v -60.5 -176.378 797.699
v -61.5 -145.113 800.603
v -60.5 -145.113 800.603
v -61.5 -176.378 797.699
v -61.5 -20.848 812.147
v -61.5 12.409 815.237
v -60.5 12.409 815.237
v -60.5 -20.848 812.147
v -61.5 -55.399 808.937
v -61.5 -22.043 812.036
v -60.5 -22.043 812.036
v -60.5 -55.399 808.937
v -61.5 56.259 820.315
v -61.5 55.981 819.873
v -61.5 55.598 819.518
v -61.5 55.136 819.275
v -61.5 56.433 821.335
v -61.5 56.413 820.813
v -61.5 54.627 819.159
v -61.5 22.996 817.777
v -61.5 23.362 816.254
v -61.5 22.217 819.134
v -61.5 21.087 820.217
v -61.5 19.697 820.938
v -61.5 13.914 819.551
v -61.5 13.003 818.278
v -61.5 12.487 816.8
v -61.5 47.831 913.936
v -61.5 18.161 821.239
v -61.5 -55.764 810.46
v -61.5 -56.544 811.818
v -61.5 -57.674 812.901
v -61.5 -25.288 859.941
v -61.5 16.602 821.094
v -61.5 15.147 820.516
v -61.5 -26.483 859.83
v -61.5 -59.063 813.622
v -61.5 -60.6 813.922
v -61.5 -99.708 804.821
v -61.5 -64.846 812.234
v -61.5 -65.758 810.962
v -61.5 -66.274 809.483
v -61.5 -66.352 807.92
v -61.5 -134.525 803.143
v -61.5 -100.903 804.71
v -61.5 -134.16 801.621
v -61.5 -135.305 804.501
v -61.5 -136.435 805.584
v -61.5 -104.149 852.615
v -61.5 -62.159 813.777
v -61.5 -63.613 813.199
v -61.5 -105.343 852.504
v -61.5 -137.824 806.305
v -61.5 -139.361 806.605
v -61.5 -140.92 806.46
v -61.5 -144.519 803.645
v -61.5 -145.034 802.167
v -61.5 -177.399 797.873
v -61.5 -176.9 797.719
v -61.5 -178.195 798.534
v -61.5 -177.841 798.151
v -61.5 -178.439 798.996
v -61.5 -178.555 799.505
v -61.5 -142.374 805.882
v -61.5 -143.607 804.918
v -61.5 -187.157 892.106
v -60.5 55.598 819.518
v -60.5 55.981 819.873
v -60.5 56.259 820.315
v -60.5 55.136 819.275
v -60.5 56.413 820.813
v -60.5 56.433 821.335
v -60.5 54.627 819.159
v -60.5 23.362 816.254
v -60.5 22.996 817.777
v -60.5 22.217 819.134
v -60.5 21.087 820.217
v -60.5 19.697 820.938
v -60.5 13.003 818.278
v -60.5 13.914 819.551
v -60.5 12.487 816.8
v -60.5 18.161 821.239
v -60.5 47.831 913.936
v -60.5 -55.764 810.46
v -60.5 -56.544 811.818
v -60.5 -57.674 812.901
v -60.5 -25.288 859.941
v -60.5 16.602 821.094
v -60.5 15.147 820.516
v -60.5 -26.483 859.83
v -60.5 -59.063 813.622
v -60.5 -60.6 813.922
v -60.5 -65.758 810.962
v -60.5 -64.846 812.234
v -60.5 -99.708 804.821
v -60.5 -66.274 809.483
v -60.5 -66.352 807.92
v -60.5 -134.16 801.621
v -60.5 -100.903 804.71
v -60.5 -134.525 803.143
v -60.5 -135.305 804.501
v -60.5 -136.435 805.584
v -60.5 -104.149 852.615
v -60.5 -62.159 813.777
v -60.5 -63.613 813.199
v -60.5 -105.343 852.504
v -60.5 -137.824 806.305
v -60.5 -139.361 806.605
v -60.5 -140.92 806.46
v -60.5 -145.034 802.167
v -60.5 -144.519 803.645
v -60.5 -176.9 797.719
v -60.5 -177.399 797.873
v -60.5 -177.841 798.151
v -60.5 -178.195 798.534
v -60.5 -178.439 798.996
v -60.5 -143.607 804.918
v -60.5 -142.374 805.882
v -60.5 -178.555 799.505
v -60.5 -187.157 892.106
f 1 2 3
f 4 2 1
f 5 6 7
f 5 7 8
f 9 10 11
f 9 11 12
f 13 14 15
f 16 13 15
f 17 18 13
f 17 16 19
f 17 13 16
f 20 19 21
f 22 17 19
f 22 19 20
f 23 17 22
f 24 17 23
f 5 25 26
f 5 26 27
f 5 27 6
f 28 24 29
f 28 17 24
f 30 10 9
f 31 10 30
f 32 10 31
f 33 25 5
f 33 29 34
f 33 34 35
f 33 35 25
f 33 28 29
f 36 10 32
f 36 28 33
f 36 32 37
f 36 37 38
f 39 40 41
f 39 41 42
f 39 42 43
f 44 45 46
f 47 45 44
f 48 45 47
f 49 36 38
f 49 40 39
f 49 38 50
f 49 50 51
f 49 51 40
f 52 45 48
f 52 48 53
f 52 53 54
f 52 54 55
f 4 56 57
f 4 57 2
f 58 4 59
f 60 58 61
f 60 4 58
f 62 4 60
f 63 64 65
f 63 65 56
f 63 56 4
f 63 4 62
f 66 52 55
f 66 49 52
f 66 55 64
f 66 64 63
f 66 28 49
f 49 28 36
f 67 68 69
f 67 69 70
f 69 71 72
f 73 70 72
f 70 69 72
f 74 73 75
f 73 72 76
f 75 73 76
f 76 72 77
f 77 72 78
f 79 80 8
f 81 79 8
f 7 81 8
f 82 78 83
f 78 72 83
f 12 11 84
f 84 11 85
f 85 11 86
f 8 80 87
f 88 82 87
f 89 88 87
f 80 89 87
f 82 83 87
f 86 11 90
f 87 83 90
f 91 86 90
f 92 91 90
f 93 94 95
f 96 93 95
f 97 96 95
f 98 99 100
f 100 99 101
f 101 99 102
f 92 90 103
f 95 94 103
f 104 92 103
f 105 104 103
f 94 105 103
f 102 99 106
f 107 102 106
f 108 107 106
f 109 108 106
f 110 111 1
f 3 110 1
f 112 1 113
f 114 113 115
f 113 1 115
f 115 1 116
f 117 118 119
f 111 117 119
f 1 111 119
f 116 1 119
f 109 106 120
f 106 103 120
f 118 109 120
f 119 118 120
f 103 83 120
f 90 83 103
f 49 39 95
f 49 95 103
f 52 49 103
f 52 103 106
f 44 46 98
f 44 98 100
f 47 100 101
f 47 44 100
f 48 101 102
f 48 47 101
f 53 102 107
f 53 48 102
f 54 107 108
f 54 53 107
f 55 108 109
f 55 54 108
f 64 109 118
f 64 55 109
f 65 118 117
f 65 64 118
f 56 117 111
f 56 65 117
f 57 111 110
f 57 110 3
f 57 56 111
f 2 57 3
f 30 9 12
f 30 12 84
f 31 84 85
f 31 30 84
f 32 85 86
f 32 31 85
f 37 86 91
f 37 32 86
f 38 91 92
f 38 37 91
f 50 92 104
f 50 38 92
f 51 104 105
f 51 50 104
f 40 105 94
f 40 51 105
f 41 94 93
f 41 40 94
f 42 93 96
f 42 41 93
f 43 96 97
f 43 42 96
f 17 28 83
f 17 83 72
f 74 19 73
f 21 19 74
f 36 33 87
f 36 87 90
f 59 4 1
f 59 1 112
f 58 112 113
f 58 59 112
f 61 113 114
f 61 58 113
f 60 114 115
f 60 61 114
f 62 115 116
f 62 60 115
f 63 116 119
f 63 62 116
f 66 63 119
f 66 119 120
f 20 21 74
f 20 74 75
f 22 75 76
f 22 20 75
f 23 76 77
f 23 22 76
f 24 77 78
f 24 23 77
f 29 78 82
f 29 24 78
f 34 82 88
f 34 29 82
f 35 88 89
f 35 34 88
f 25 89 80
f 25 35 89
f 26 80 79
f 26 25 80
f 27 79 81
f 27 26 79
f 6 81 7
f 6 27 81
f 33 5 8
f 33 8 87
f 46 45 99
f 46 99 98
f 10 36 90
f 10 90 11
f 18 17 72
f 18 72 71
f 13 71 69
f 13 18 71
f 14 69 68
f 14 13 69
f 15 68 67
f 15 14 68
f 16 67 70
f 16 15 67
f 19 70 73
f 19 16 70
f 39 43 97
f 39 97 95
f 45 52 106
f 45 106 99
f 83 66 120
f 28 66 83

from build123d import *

# Parameters (mm, degrees)
EXTRUDE_1_DEPTH = 1


with BuildPart() as part:
    # 草图1 → 凸台-拉伸1 (new body)
    with BuildSketch(Plane(origin=(-61.5, 0, 0), x_dir=(0, -1, 0), z_dir=(-1, 0, 0))):
        with BuildLine():
            Line((145.112990447, 800.603209432), (176.378367534, 797.698696456))
            ThreePointArc((176.378367534, 797.698696456), (177.840703349, 798.15115608), (178.554793652, 799.505120921))
            Line((178.554793652, 799.505120921), (187.157332086, 892.106397006))
            Line((187.157332086, 892.106397006), (-47.830852387, 913.936494537))
            Line((-47.830852387, 913.936494537), (-56.433390821, 821.335218452))
            ThreePointArc((-56.433390821, 821.335218452), (-55.980931196, 819.872882636), (-54.626966355, 819.158792334))
            Line((-54.626966355, 819.158792334), (-23.361589268, 816.254279357))
            ThreePointArc((-23.361589268, 816.254279357), (-17.376417442, 821.221946637), (-12.408750162, 815.236774811))
            Line((-12.408750162, 815.236774811), (20.848052217, 812.147261008))
            Line((20.848052217, 812.147261008), (25.288072054, 859.941468019))
            Line((25.288072054, 859.941468019), (26.482927229, 859.830467523))
            Line((26.482927229, 859.830467523), (22.042907393, 812.036260512))
            Line((22.042907393, 812.036260512), (55.399281036, 808.937496668))
            ThreePointArc((55.399281036, 808.937496668), (61.384452862, 813.905163948), (66.352120143, 807.919992122))
            Line((66.352120143, 807.919992122), (99.708493786, 804.821228277))
            Line((99.708493786, 804.821228277), (104.148513623, 852.615435289))
            Line((104.148513623, 852.615435289), (105.343368798, 852.504434793))
            Line((105.343368798, 852.504434793), (100.903348961, 804.710227781))
            Line((100.903348961, 804.710227781), (134.16015134, 801.620713978))
            ThreePointArc((134.16015134, 801.620713978), (140.145323166, 806.588381259), (145.112990447, 800.603209432))
        make_face()
    extrude(amount=-EXTRUDE_1_DEPTH)


solid = part.part
